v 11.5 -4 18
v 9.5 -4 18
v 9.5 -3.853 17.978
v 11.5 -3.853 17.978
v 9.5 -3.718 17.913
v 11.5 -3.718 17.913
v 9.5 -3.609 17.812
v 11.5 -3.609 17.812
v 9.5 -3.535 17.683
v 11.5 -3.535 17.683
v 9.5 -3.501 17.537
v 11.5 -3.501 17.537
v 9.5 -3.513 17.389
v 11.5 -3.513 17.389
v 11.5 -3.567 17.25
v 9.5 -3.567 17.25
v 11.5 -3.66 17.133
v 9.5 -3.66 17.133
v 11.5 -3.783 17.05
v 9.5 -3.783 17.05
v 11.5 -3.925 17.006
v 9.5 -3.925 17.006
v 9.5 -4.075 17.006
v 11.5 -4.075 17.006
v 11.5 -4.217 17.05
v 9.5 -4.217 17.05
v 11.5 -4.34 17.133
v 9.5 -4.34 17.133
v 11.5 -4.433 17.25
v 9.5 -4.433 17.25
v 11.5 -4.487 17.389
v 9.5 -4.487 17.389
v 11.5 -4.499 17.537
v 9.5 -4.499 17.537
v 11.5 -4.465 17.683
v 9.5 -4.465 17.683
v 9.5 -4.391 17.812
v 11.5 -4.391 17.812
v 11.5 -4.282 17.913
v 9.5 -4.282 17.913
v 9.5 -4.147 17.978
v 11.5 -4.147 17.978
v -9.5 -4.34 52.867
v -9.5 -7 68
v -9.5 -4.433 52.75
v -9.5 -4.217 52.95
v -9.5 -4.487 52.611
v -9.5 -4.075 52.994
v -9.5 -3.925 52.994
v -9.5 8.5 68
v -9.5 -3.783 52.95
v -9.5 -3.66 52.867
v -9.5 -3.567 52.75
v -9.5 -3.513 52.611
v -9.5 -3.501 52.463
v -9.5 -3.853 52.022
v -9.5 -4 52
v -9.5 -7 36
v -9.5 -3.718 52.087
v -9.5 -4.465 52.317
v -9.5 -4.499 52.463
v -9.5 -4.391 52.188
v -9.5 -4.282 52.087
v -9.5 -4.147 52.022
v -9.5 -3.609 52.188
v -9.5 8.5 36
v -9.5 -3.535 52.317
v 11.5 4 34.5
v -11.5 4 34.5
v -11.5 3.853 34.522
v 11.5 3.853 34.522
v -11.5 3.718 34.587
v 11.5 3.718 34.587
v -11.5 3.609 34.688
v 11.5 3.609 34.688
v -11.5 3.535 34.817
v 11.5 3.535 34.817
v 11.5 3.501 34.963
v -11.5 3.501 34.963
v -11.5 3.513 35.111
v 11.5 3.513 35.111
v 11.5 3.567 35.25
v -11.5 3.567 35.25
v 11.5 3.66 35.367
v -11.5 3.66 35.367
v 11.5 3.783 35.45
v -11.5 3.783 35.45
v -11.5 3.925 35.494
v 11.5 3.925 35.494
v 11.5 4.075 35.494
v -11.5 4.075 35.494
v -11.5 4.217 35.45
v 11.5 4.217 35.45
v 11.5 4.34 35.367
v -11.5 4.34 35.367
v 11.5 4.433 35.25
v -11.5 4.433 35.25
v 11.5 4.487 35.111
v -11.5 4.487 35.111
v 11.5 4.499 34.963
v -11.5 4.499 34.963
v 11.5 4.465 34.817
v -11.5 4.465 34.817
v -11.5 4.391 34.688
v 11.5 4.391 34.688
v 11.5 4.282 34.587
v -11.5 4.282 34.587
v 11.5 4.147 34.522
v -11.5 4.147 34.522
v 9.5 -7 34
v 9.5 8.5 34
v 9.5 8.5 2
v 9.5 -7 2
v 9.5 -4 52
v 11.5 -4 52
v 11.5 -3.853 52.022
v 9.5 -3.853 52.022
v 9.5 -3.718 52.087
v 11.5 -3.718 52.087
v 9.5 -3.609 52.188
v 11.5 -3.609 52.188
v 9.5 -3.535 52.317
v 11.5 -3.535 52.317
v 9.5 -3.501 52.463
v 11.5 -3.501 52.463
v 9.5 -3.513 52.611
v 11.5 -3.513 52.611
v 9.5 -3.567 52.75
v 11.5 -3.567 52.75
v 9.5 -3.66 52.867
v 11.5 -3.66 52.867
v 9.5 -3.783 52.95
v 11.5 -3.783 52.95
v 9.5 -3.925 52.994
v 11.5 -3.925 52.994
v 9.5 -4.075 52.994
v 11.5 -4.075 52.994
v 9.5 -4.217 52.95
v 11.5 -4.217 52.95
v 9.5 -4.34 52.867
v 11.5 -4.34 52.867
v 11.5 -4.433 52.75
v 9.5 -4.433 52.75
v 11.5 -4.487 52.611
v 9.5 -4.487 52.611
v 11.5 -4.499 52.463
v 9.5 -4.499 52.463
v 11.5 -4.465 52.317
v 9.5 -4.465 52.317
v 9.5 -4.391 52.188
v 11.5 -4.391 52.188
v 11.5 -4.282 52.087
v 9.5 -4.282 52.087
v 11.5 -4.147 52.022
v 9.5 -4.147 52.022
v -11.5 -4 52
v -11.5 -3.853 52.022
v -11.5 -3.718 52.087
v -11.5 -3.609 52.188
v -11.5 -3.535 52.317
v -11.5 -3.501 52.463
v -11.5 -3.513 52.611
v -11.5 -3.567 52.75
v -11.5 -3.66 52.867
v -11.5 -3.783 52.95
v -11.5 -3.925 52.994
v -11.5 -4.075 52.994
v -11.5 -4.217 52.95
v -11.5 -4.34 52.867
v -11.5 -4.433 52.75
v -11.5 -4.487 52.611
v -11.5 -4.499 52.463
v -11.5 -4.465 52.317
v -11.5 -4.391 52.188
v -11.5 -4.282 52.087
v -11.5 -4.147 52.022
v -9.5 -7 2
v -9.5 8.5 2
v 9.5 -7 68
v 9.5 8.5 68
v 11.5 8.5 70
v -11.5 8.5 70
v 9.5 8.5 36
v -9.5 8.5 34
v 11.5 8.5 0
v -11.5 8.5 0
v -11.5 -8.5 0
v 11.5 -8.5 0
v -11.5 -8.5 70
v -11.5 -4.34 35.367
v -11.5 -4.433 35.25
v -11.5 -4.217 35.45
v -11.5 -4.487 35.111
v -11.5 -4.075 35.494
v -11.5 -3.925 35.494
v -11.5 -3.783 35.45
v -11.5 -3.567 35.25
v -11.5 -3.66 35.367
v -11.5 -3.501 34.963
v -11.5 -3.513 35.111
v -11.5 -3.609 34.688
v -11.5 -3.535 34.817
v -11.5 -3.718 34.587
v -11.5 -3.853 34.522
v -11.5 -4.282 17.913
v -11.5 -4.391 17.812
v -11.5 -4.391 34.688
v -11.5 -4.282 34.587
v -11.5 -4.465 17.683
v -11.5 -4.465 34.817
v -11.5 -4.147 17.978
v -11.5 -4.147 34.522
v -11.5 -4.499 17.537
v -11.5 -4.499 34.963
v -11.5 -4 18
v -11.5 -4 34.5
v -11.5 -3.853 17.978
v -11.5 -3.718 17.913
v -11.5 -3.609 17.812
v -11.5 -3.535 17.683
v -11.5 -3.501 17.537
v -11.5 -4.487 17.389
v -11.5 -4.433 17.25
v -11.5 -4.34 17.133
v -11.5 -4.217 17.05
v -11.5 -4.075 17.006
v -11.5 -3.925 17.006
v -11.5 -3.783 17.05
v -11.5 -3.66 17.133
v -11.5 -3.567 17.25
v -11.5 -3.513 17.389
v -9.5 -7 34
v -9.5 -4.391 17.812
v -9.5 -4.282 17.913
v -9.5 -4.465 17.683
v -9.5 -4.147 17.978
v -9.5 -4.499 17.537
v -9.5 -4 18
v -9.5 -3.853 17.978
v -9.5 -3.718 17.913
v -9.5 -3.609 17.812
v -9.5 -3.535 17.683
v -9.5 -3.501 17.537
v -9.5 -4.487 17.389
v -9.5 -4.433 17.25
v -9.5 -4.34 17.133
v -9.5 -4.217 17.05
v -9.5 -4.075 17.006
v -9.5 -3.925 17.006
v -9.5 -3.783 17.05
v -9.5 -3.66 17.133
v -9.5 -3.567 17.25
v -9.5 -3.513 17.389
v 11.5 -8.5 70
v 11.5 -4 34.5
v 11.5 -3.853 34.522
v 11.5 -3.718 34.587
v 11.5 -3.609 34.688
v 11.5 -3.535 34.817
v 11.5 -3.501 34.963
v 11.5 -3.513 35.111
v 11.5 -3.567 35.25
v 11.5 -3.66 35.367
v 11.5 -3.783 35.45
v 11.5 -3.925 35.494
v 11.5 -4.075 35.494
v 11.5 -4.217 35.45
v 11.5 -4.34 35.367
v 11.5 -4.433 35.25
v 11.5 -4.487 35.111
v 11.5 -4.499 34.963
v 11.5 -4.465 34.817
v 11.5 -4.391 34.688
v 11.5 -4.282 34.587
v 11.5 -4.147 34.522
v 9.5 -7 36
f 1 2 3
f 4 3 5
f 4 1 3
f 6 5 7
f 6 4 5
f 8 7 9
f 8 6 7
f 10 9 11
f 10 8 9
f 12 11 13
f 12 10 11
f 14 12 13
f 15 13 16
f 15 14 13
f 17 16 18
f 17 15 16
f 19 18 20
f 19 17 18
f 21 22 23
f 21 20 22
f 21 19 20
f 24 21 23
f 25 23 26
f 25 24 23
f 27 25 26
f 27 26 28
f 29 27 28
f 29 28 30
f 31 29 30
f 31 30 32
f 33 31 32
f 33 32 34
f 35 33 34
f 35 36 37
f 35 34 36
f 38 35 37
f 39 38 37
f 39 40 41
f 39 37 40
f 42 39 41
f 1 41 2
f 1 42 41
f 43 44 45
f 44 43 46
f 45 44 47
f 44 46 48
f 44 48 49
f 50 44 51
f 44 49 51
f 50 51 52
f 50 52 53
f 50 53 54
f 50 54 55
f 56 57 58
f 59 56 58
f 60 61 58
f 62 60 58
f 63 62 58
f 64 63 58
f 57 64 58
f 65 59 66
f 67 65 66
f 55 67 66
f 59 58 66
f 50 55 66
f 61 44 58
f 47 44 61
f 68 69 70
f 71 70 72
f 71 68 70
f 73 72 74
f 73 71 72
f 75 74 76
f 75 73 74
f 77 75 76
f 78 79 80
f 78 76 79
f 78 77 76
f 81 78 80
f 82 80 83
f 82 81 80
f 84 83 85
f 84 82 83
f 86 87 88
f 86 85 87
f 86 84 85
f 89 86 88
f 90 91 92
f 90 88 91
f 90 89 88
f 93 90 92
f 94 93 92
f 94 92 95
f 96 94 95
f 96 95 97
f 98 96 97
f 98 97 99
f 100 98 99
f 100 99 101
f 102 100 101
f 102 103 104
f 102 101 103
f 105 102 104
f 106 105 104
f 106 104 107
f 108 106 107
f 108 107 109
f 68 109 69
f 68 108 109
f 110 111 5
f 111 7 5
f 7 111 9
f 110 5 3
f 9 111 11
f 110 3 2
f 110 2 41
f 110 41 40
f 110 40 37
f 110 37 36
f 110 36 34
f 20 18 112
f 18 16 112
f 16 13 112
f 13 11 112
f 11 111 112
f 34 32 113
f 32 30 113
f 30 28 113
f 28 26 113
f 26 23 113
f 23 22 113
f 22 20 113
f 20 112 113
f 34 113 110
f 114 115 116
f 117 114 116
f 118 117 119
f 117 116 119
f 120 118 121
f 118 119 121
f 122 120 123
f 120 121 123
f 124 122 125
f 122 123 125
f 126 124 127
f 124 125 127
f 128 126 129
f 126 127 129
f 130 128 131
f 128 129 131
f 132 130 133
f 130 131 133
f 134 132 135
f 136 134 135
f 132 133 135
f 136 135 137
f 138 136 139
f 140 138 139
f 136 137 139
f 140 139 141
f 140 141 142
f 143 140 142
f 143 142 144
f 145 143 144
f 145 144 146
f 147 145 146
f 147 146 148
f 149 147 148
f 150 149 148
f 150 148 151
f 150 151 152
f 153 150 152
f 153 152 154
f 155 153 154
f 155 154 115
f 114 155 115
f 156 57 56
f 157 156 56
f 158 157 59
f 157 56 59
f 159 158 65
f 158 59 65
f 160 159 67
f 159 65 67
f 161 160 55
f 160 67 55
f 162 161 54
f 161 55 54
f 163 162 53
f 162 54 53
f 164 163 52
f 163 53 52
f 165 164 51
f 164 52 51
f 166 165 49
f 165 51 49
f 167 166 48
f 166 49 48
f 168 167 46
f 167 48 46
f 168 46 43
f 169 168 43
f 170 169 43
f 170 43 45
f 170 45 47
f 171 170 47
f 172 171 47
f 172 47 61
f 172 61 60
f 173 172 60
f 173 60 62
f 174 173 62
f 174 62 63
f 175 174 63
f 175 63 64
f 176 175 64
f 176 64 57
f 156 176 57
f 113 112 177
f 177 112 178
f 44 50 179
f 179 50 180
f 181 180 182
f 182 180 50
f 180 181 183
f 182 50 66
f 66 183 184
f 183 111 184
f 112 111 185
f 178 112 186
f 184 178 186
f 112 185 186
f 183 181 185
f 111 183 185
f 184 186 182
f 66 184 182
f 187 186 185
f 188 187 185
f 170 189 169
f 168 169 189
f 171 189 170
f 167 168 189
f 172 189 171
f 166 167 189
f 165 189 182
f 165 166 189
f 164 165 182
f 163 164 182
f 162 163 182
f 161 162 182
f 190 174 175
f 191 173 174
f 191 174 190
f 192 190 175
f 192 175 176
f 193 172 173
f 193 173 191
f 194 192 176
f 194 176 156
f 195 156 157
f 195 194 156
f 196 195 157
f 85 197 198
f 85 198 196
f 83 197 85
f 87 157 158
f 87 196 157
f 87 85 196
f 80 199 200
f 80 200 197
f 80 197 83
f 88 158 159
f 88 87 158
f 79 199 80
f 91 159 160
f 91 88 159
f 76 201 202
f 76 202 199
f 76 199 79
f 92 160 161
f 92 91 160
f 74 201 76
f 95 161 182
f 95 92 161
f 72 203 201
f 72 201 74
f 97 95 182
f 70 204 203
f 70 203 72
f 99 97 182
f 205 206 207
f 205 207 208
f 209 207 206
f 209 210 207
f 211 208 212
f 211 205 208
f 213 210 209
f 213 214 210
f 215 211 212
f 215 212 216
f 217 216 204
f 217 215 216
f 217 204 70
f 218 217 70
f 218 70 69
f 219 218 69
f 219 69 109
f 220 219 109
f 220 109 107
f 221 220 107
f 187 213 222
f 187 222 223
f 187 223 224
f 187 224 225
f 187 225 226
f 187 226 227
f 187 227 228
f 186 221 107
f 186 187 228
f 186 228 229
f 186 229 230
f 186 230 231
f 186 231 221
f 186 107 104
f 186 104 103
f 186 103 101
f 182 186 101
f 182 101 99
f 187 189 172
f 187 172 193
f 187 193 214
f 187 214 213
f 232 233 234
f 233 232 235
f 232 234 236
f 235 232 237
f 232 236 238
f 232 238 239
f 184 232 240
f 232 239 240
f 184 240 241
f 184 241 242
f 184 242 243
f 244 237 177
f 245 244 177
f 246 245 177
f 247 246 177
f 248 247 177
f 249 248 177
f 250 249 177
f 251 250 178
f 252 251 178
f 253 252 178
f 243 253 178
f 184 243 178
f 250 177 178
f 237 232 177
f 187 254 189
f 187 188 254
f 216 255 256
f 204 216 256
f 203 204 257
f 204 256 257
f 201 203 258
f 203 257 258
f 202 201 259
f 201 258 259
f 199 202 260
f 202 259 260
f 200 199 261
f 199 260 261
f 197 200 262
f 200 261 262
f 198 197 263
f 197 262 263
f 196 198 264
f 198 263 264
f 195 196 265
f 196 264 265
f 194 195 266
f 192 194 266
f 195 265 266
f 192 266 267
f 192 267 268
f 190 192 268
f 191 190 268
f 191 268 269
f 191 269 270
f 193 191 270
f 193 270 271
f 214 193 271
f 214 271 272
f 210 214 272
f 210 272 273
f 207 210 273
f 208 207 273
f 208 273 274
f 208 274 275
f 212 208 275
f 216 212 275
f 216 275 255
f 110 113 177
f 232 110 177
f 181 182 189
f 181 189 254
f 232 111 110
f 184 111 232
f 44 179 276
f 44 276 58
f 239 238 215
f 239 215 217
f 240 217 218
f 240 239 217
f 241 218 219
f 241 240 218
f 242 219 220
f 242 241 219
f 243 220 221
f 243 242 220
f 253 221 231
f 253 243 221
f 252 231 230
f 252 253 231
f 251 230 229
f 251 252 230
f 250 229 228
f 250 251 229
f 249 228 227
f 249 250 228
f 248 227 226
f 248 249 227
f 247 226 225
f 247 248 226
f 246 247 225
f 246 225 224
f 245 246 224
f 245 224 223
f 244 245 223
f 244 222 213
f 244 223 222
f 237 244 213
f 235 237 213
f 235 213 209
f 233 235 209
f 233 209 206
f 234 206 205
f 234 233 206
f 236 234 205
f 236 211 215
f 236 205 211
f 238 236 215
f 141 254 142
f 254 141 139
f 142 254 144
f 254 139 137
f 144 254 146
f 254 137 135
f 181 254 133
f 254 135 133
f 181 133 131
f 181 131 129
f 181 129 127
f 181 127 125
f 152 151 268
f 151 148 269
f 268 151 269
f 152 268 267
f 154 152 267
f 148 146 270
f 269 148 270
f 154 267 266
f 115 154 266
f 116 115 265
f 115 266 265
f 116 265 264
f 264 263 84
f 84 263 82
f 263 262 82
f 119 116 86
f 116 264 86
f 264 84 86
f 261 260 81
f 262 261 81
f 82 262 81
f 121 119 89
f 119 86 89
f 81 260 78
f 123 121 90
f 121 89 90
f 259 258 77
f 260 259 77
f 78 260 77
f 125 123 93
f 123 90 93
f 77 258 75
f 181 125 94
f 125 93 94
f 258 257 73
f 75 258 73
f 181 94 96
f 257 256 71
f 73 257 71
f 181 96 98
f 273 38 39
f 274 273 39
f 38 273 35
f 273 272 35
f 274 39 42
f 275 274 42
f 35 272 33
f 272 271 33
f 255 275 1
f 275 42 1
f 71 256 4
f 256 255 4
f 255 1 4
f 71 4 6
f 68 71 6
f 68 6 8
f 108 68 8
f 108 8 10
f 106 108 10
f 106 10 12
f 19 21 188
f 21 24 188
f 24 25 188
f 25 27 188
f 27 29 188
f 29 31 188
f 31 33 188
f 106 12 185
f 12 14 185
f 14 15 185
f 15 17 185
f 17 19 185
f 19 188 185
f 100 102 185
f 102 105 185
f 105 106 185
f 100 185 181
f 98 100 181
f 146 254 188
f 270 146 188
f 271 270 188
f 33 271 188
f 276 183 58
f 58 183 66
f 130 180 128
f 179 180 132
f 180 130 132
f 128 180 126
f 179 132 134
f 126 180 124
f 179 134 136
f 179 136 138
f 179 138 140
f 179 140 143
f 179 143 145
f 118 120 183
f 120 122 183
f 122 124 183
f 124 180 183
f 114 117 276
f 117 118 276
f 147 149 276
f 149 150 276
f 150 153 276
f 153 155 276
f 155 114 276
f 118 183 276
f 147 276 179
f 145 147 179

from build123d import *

# Parameters (mm, degrees)
BOSS_EXTRUDE1_DEPTH      = 70
SKETCH2_W                = 23
SKETCH2_H                = 17
BOSS_EXTRUDE2_DEPTH      = 2
SKETCH3_W                = 23
SKETCH3_H                = 17
BOSS_EXTRUDE3_DEPTH      = 2
SKETCH4_W                = 23
SKETCH4_H                = 17
BOSS_EXTRUDE4_DEPTH      = 1
BOSS_EXTRUDE4_DEPTH_BACK = 1
SKETCH6_R                = 0.5
CUT_EXTRUDE7_DEPTH       = 57
SKETCH7_R                = 0.5
CUT_EXTRUDE8_DEPTH       = 57


with BuildPart() as part:
    # Sketch1 → Boss-Extrude1 (new body)
    with BuildSketch(Plane.XY):
        Polygon((-11.5, 8.5), (-11.5, -8.5), (11.5, -8.5), (11.5, 8.5), (9.5, 8.5), (9.5, 7), (9.5, -7), (-9.5, -7), (-9.5, 7), (-9.5, 8.5), align=None)
    extrude(amount=BOSS_EXTRUDE1_DEPTH)

    # Sketch2 → Boss-Extrude2 (add)
    with BuildSketch(Plane.XY.offset(70)):
        Rectangle(SKETCH2_W, SKETCH2_H)
    extrude(amount=-BOSS_EXTRUDE2_DEPTH)

    # Sketch3 → Boss-Extrude3 (add)
    with BuildSketch(Plane(origin=(0, 0, 0), x_dir=(-1, 0, 0), z_dir=(0, 0, -1))):
        Rectangle(SKETCH3_W, SKETCH3_H)
    extrude(amount=-BOSS_EXTRUDE3_DEPTH)

    # Sketch4 → Boss-Extrude4 (add, two sides)
    with BuildSketch(Plane(origin=(0, 0, 35), x_dir=(-1, 0, 0), z_dir=(0, 0, -1))) as boss_extrude4_sk:
        Rectangle(SKETCH4_W, SKETCH4_H)
    extrude(amount=BOSS_EXTRUDE4_DEPTH)
    extrude(boss_extrude4_sk.sketch, amount=-BOSS_EXTRUDE4_DEPTH_BACK)

    # Sketch6 → Cut-Extrude7 (cut)
    with BuildSketch(Plane(origin=(11.5, 0, 0), x_dir=(0, 0, -1), z_dir=(1, 0, 0))):
        with Locations((-35, -4)):
            Circle(SKETCH6_R)
    cut_extrude7 = extrude(amount=-CUT_EXTRUDE7_DEPTH, mode=Mode.SUBTRACT)

    # Sketch7 → Cut-Extrude8 (cut)
    with BuildSketch(Plane(origin=(11.5, 0, 0), x_dir=(0, 0, -1), z_dir=(1, 0, 0))):
        with Locations((-52.5, -4)):
            Circle(SKETCH7_R)
    cut_extrude8 = extrude(amount=-CUT_EXTRUDE8_DEPTH, mode=Mode.SUBTRACT)

    # Mirror1: Cut-Extrude8 across plane
    add(cut_extrude8.mirror(Plane(origin=(0, 0, 35), x_dir=(1, 0, 0), z_dir=(0, 0, -1))), mode=Mode.SUBTRACT)

    # Mirror2: Cut-Extrude7 across plane
    add(cut_extrude7.mirror(Plane.ZX), mode=Mode.SUBTRACT)


solid = part.part
